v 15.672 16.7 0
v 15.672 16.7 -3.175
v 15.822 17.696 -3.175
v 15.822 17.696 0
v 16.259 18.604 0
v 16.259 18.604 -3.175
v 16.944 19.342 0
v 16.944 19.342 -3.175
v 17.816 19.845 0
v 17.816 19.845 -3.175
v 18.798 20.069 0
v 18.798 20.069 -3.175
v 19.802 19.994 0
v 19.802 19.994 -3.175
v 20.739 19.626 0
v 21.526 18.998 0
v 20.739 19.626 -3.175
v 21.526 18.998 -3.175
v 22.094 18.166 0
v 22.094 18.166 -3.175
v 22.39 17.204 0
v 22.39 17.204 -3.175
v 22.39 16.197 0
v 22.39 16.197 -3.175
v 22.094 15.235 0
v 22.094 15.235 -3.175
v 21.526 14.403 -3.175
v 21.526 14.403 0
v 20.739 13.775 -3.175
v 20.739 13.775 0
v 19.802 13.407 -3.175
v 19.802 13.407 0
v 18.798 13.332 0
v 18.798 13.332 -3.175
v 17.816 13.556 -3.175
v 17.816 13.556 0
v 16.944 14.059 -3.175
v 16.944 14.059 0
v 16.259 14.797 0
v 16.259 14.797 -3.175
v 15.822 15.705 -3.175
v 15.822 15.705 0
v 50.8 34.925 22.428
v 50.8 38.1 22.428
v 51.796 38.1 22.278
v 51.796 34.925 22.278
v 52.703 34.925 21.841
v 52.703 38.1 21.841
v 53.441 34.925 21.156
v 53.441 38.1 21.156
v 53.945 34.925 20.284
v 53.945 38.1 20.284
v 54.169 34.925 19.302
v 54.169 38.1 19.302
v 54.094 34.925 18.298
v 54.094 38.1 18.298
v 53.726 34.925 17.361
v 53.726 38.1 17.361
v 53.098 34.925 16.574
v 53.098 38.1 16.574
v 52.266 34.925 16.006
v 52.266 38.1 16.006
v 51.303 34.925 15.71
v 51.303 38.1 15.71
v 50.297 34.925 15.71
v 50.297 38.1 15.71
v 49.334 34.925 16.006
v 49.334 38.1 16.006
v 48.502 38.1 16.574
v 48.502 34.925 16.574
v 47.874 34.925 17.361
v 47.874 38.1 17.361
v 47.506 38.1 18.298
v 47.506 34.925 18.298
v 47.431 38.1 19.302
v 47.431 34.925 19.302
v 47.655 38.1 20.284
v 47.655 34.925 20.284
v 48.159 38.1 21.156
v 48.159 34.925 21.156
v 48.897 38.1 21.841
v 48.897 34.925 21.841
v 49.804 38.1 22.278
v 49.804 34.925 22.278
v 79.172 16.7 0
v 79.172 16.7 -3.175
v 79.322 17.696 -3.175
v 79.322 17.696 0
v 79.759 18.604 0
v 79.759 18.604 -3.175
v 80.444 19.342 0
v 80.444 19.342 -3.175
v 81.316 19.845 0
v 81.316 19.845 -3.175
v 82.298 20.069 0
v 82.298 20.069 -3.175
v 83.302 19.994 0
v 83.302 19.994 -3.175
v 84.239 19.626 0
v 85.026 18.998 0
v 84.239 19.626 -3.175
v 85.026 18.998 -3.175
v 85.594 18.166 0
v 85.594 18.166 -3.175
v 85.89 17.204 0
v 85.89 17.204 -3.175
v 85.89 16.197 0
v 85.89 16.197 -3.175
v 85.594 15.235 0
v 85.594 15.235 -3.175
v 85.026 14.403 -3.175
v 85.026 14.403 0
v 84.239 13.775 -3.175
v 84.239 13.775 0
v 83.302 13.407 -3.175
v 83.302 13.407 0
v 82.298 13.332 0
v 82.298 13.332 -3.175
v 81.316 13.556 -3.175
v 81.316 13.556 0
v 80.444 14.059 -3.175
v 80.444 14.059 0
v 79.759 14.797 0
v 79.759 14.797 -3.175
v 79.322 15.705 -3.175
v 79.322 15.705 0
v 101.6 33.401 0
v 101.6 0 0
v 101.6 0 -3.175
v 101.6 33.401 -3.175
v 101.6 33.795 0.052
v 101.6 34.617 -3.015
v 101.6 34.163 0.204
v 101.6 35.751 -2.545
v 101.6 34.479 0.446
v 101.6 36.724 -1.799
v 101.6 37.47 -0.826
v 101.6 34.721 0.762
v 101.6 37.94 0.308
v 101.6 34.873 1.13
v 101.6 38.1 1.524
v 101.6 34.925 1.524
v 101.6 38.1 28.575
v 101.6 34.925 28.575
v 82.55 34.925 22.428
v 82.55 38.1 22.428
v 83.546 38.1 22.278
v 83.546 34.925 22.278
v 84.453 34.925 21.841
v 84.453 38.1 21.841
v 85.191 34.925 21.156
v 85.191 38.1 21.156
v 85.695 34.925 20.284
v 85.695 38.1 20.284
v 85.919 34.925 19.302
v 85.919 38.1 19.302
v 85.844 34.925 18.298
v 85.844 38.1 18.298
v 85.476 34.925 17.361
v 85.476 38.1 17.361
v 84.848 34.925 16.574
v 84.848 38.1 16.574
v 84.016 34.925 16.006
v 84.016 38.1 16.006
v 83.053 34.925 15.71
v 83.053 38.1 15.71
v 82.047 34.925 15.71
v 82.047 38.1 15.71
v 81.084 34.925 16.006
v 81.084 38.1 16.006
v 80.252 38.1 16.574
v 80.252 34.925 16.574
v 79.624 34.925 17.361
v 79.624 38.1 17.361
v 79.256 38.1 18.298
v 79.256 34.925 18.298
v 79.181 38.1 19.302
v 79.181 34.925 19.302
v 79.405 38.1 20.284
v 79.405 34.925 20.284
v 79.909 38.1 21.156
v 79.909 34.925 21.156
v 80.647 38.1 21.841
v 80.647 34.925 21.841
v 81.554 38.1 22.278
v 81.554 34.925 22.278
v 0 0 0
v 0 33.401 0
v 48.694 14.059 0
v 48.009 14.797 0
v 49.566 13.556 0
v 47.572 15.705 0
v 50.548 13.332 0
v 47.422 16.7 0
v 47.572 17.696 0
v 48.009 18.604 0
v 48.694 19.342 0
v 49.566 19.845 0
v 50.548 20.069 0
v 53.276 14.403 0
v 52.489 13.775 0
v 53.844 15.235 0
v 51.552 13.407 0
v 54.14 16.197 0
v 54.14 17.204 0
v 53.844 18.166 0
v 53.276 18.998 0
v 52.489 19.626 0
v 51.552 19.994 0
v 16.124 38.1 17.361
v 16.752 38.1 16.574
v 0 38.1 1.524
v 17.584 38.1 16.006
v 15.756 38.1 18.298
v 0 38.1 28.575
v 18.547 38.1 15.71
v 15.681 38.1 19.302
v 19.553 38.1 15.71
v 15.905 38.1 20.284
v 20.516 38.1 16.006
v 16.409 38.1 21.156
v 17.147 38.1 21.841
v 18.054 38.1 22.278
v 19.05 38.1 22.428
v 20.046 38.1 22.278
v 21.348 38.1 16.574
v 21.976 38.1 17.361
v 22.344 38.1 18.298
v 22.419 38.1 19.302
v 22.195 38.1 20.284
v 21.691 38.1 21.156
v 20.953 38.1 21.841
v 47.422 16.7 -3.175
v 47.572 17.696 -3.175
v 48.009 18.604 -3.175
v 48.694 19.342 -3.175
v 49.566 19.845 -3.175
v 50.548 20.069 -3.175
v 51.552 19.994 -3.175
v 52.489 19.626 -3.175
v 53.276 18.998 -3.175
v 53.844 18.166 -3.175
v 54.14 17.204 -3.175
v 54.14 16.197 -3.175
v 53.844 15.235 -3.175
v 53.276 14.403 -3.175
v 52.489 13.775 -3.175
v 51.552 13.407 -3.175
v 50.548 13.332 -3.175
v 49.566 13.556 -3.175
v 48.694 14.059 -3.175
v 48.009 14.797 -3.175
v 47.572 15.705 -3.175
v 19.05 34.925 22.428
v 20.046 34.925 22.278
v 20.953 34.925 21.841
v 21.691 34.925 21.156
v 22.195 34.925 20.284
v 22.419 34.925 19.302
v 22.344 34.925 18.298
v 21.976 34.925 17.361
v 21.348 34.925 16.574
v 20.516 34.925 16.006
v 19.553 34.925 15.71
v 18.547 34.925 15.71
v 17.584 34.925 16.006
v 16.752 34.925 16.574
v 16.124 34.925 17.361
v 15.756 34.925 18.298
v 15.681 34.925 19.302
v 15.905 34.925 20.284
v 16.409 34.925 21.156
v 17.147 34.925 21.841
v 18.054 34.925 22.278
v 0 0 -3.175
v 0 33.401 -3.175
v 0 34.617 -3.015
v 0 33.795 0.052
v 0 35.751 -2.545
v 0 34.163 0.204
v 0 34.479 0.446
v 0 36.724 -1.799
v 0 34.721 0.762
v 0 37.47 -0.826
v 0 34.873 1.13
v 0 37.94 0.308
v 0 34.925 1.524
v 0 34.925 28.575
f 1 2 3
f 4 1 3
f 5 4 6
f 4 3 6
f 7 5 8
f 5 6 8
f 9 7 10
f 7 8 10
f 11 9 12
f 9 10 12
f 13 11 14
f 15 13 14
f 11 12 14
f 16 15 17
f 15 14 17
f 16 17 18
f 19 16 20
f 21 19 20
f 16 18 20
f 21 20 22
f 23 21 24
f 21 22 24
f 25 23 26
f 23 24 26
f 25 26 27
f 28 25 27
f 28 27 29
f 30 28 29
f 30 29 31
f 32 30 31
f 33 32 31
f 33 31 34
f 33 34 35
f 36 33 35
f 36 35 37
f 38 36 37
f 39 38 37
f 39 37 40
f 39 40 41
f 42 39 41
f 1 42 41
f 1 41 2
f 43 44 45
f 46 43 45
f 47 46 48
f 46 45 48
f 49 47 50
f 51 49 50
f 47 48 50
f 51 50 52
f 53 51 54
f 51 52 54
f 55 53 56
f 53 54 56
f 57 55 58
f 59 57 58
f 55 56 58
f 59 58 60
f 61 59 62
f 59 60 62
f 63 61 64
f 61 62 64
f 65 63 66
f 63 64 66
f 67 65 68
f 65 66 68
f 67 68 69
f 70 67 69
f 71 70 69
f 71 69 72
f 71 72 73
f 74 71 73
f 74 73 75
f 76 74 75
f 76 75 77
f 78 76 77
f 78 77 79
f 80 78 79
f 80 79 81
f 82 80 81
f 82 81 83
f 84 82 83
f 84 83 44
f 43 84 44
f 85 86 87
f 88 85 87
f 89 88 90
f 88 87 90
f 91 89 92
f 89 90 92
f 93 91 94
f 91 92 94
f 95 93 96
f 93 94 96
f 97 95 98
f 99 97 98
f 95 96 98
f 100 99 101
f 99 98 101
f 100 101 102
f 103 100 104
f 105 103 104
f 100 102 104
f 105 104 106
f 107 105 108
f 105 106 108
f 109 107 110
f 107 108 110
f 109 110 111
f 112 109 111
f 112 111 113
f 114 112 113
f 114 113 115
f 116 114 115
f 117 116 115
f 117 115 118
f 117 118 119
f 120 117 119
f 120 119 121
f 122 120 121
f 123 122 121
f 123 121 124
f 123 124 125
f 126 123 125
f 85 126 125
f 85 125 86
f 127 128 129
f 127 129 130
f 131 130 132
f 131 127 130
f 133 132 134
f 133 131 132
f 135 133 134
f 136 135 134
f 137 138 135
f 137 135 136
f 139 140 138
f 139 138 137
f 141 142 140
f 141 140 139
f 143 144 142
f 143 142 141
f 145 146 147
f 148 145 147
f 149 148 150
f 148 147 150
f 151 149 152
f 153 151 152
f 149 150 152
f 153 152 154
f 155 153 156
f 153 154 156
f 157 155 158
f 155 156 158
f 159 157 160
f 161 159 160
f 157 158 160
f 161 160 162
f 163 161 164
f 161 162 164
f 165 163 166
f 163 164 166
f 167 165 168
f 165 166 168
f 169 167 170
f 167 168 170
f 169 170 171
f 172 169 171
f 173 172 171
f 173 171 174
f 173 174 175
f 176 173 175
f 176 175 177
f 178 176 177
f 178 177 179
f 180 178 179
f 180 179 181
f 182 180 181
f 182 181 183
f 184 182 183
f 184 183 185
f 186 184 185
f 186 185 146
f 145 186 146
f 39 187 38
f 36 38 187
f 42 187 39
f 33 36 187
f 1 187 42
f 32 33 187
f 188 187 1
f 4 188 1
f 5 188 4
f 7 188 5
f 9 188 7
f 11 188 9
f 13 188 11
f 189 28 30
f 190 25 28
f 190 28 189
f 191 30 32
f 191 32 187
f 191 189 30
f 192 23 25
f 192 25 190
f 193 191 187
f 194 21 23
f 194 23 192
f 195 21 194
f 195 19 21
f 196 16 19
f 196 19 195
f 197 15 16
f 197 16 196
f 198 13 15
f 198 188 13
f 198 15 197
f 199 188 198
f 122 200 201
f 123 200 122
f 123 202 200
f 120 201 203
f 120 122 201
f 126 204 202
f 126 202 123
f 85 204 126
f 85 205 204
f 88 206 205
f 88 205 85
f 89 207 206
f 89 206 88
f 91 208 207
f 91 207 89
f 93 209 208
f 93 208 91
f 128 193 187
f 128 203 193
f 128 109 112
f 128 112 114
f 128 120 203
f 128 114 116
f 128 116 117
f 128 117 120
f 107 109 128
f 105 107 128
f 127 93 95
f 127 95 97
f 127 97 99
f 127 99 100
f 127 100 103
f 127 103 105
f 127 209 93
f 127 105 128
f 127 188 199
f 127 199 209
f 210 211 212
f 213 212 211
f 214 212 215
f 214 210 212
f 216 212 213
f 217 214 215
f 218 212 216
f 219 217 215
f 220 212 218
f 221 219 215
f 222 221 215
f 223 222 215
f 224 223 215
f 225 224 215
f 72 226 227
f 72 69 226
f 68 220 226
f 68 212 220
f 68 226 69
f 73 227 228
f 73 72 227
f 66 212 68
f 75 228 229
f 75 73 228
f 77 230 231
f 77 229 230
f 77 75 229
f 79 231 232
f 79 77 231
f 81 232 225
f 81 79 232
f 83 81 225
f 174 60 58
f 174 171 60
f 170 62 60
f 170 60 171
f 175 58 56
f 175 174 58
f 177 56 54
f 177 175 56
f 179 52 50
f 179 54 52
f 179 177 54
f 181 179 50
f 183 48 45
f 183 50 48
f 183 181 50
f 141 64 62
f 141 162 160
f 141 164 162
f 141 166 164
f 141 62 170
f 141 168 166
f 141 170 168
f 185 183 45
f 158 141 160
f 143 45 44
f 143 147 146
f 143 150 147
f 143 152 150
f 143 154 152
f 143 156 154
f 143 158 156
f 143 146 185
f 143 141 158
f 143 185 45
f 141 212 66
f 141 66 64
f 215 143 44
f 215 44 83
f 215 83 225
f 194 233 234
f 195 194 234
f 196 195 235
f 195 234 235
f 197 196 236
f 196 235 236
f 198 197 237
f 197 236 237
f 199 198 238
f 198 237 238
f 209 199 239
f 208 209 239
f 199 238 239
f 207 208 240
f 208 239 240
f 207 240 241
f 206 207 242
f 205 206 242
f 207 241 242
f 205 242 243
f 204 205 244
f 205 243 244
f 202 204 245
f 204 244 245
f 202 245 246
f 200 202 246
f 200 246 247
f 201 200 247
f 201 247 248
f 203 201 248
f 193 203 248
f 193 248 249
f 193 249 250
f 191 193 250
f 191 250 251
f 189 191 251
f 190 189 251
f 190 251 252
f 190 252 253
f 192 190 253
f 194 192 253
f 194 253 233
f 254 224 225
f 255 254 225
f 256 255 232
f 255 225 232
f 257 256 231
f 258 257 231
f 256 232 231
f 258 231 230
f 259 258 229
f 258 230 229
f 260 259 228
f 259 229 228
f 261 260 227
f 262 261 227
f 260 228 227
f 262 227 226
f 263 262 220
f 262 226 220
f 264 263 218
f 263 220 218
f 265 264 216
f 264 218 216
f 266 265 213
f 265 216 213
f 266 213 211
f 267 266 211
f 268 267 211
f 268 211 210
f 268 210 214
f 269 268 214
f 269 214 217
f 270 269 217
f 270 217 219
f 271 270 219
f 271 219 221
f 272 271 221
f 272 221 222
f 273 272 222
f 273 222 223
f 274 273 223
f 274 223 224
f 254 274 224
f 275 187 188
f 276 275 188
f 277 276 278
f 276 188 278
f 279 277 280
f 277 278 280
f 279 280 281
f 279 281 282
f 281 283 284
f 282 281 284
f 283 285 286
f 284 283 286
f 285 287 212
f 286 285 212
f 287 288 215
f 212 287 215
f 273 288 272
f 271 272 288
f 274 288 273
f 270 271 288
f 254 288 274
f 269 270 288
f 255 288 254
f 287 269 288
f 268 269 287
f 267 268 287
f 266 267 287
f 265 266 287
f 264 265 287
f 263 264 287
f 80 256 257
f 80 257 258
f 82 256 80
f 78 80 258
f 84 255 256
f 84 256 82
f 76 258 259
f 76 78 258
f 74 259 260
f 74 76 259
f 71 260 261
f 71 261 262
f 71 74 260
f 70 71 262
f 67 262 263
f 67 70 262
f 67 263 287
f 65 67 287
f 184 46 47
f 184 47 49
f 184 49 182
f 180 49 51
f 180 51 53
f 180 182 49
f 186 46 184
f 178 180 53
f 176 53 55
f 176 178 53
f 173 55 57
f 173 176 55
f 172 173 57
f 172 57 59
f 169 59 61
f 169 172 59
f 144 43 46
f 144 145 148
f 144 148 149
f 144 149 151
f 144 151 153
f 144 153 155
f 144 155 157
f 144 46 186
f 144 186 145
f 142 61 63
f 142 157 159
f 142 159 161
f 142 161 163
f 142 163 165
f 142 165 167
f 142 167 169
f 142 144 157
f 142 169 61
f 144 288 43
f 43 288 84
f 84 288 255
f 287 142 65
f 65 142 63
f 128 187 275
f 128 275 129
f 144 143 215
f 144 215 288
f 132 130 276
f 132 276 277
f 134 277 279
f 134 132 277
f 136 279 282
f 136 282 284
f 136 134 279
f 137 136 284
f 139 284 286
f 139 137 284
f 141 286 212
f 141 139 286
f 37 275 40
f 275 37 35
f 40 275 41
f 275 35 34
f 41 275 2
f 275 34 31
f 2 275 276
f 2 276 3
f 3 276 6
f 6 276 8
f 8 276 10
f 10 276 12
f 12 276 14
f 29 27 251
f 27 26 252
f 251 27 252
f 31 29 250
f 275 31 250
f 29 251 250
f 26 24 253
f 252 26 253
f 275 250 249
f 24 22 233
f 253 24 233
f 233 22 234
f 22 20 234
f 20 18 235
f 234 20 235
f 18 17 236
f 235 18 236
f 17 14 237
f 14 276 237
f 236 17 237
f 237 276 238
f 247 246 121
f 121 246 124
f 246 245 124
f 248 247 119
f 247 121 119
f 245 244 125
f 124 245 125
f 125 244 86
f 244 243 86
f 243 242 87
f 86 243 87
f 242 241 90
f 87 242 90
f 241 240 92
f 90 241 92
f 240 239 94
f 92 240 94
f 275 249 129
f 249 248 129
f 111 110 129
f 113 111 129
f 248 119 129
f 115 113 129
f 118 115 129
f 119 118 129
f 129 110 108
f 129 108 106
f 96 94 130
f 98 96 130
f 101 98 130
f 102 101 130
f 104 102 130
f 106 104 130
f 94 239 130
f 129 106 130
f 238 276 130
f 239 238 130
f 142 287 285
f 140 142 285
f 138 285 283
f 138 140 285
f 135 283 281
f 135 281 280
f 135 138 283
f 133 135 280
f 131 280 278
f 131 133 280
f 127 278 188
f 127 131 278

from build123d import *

# Parameters (mm, degrees)
SKETCH1_W                         = 101.6
SKETCH1_H                         = 38.1
BASE_FLANGE1_DEPTH                = 3.175
EDGE_FLANGE1_STRIP_W              = 15.748
EDGE_FLANGE1_STRIP_H              = 3.175
EDGE_FLANGE1_STRIP_CUT_DEPTH      = 101.6
EDGE_FLANGE1_DEPTH                = 101.6
F_1_4_CLEARANCE_HOLE1_D           = 6.7564
F_1_4_CLEARANCE_HOLE1_ON_FACE_2_D = 6.7564


# Sheet-metal steps are written as plain solids
with BuildPart() as part:
    # Sketch1 → Base-Flange1 (new body)
    with BuildSketch(Plane.XY):
        with Locations((50.8, 19.05)):
            Rectangle(SKETCH1_W, SKETCH1_H)
    extrude(amount=-BASE_FLANGE1_DEPTH)

    # Edge-Flange1 strip (across the edge) → Edge-Flange1 strip cut (cut)
    with BuildSketch(Plane(origin=(101.6, 38.1, 0), x_dir=(0, -1, 0), z_dir=(-1, 0, 0))):
        with Locations((-3.175, -1.5875)):
            Rectangle(EDGE_FLANGE1_STRIP_W, EDGE_FLANGE1_STRIP_H)
    extrude(amount=EDGE_FLANGE1_STRIP_CUT_DEPTH, mode=Mode.SUBTRACT)

    # Edge-Flange1 section (across the edge) → Edge-Flange1 (add)
    with BuildSketch(Plane(origin=(101.6, 38.1, 0), x_dir=(0, -1, 0), z_dir=(-1, 0, 0))):
        with BuildLine():
            Line((0, 1.524), (0, 28.575))
            Line((0, 28.575), (3.175, 28.575))
            Line((3.175, 28.575), (3.175, 1.524))
            ThreePointArc((3.175, 1.524), (3.621369265, 0.446369265), (4.699, 0))
            Line((4.699, 0), (4.699, -3.175))
            ThreePointArc((4.699, -3.175), (1.376305235, -1.798694765), (0, 1.524))
        make_face()
    extrude(amount=EDGE_FLANGE1_DEPTH)

    # 1/4 Clearance Hole1 (through all)
    with Locations(Plane(origin=(82.55, 16.7005, 0), x_dir=(1, 0, 0), z_dir=(0, 0, 1))):
        with Locations((0, 0), (-31.75, 0), (-63.5, 0)):
            Hole(F_1_4_CLEARANCE_HOLE1_D / 2)

    # 1/4 Clearance Hole1 on face 2 (through all)
    with Locations(Plane(origin=(82.55, 34.925, 19.05), x_dir=(0, 0, -1), z_dir=(0, -1, 0))):
        with Locations((0, 0), (0, -31.75), (0, -63.5)):
            Hole(F_1_4_CLEARANCE_HOLE1_ON_FACE_2_D / 2)


solid = part.part
